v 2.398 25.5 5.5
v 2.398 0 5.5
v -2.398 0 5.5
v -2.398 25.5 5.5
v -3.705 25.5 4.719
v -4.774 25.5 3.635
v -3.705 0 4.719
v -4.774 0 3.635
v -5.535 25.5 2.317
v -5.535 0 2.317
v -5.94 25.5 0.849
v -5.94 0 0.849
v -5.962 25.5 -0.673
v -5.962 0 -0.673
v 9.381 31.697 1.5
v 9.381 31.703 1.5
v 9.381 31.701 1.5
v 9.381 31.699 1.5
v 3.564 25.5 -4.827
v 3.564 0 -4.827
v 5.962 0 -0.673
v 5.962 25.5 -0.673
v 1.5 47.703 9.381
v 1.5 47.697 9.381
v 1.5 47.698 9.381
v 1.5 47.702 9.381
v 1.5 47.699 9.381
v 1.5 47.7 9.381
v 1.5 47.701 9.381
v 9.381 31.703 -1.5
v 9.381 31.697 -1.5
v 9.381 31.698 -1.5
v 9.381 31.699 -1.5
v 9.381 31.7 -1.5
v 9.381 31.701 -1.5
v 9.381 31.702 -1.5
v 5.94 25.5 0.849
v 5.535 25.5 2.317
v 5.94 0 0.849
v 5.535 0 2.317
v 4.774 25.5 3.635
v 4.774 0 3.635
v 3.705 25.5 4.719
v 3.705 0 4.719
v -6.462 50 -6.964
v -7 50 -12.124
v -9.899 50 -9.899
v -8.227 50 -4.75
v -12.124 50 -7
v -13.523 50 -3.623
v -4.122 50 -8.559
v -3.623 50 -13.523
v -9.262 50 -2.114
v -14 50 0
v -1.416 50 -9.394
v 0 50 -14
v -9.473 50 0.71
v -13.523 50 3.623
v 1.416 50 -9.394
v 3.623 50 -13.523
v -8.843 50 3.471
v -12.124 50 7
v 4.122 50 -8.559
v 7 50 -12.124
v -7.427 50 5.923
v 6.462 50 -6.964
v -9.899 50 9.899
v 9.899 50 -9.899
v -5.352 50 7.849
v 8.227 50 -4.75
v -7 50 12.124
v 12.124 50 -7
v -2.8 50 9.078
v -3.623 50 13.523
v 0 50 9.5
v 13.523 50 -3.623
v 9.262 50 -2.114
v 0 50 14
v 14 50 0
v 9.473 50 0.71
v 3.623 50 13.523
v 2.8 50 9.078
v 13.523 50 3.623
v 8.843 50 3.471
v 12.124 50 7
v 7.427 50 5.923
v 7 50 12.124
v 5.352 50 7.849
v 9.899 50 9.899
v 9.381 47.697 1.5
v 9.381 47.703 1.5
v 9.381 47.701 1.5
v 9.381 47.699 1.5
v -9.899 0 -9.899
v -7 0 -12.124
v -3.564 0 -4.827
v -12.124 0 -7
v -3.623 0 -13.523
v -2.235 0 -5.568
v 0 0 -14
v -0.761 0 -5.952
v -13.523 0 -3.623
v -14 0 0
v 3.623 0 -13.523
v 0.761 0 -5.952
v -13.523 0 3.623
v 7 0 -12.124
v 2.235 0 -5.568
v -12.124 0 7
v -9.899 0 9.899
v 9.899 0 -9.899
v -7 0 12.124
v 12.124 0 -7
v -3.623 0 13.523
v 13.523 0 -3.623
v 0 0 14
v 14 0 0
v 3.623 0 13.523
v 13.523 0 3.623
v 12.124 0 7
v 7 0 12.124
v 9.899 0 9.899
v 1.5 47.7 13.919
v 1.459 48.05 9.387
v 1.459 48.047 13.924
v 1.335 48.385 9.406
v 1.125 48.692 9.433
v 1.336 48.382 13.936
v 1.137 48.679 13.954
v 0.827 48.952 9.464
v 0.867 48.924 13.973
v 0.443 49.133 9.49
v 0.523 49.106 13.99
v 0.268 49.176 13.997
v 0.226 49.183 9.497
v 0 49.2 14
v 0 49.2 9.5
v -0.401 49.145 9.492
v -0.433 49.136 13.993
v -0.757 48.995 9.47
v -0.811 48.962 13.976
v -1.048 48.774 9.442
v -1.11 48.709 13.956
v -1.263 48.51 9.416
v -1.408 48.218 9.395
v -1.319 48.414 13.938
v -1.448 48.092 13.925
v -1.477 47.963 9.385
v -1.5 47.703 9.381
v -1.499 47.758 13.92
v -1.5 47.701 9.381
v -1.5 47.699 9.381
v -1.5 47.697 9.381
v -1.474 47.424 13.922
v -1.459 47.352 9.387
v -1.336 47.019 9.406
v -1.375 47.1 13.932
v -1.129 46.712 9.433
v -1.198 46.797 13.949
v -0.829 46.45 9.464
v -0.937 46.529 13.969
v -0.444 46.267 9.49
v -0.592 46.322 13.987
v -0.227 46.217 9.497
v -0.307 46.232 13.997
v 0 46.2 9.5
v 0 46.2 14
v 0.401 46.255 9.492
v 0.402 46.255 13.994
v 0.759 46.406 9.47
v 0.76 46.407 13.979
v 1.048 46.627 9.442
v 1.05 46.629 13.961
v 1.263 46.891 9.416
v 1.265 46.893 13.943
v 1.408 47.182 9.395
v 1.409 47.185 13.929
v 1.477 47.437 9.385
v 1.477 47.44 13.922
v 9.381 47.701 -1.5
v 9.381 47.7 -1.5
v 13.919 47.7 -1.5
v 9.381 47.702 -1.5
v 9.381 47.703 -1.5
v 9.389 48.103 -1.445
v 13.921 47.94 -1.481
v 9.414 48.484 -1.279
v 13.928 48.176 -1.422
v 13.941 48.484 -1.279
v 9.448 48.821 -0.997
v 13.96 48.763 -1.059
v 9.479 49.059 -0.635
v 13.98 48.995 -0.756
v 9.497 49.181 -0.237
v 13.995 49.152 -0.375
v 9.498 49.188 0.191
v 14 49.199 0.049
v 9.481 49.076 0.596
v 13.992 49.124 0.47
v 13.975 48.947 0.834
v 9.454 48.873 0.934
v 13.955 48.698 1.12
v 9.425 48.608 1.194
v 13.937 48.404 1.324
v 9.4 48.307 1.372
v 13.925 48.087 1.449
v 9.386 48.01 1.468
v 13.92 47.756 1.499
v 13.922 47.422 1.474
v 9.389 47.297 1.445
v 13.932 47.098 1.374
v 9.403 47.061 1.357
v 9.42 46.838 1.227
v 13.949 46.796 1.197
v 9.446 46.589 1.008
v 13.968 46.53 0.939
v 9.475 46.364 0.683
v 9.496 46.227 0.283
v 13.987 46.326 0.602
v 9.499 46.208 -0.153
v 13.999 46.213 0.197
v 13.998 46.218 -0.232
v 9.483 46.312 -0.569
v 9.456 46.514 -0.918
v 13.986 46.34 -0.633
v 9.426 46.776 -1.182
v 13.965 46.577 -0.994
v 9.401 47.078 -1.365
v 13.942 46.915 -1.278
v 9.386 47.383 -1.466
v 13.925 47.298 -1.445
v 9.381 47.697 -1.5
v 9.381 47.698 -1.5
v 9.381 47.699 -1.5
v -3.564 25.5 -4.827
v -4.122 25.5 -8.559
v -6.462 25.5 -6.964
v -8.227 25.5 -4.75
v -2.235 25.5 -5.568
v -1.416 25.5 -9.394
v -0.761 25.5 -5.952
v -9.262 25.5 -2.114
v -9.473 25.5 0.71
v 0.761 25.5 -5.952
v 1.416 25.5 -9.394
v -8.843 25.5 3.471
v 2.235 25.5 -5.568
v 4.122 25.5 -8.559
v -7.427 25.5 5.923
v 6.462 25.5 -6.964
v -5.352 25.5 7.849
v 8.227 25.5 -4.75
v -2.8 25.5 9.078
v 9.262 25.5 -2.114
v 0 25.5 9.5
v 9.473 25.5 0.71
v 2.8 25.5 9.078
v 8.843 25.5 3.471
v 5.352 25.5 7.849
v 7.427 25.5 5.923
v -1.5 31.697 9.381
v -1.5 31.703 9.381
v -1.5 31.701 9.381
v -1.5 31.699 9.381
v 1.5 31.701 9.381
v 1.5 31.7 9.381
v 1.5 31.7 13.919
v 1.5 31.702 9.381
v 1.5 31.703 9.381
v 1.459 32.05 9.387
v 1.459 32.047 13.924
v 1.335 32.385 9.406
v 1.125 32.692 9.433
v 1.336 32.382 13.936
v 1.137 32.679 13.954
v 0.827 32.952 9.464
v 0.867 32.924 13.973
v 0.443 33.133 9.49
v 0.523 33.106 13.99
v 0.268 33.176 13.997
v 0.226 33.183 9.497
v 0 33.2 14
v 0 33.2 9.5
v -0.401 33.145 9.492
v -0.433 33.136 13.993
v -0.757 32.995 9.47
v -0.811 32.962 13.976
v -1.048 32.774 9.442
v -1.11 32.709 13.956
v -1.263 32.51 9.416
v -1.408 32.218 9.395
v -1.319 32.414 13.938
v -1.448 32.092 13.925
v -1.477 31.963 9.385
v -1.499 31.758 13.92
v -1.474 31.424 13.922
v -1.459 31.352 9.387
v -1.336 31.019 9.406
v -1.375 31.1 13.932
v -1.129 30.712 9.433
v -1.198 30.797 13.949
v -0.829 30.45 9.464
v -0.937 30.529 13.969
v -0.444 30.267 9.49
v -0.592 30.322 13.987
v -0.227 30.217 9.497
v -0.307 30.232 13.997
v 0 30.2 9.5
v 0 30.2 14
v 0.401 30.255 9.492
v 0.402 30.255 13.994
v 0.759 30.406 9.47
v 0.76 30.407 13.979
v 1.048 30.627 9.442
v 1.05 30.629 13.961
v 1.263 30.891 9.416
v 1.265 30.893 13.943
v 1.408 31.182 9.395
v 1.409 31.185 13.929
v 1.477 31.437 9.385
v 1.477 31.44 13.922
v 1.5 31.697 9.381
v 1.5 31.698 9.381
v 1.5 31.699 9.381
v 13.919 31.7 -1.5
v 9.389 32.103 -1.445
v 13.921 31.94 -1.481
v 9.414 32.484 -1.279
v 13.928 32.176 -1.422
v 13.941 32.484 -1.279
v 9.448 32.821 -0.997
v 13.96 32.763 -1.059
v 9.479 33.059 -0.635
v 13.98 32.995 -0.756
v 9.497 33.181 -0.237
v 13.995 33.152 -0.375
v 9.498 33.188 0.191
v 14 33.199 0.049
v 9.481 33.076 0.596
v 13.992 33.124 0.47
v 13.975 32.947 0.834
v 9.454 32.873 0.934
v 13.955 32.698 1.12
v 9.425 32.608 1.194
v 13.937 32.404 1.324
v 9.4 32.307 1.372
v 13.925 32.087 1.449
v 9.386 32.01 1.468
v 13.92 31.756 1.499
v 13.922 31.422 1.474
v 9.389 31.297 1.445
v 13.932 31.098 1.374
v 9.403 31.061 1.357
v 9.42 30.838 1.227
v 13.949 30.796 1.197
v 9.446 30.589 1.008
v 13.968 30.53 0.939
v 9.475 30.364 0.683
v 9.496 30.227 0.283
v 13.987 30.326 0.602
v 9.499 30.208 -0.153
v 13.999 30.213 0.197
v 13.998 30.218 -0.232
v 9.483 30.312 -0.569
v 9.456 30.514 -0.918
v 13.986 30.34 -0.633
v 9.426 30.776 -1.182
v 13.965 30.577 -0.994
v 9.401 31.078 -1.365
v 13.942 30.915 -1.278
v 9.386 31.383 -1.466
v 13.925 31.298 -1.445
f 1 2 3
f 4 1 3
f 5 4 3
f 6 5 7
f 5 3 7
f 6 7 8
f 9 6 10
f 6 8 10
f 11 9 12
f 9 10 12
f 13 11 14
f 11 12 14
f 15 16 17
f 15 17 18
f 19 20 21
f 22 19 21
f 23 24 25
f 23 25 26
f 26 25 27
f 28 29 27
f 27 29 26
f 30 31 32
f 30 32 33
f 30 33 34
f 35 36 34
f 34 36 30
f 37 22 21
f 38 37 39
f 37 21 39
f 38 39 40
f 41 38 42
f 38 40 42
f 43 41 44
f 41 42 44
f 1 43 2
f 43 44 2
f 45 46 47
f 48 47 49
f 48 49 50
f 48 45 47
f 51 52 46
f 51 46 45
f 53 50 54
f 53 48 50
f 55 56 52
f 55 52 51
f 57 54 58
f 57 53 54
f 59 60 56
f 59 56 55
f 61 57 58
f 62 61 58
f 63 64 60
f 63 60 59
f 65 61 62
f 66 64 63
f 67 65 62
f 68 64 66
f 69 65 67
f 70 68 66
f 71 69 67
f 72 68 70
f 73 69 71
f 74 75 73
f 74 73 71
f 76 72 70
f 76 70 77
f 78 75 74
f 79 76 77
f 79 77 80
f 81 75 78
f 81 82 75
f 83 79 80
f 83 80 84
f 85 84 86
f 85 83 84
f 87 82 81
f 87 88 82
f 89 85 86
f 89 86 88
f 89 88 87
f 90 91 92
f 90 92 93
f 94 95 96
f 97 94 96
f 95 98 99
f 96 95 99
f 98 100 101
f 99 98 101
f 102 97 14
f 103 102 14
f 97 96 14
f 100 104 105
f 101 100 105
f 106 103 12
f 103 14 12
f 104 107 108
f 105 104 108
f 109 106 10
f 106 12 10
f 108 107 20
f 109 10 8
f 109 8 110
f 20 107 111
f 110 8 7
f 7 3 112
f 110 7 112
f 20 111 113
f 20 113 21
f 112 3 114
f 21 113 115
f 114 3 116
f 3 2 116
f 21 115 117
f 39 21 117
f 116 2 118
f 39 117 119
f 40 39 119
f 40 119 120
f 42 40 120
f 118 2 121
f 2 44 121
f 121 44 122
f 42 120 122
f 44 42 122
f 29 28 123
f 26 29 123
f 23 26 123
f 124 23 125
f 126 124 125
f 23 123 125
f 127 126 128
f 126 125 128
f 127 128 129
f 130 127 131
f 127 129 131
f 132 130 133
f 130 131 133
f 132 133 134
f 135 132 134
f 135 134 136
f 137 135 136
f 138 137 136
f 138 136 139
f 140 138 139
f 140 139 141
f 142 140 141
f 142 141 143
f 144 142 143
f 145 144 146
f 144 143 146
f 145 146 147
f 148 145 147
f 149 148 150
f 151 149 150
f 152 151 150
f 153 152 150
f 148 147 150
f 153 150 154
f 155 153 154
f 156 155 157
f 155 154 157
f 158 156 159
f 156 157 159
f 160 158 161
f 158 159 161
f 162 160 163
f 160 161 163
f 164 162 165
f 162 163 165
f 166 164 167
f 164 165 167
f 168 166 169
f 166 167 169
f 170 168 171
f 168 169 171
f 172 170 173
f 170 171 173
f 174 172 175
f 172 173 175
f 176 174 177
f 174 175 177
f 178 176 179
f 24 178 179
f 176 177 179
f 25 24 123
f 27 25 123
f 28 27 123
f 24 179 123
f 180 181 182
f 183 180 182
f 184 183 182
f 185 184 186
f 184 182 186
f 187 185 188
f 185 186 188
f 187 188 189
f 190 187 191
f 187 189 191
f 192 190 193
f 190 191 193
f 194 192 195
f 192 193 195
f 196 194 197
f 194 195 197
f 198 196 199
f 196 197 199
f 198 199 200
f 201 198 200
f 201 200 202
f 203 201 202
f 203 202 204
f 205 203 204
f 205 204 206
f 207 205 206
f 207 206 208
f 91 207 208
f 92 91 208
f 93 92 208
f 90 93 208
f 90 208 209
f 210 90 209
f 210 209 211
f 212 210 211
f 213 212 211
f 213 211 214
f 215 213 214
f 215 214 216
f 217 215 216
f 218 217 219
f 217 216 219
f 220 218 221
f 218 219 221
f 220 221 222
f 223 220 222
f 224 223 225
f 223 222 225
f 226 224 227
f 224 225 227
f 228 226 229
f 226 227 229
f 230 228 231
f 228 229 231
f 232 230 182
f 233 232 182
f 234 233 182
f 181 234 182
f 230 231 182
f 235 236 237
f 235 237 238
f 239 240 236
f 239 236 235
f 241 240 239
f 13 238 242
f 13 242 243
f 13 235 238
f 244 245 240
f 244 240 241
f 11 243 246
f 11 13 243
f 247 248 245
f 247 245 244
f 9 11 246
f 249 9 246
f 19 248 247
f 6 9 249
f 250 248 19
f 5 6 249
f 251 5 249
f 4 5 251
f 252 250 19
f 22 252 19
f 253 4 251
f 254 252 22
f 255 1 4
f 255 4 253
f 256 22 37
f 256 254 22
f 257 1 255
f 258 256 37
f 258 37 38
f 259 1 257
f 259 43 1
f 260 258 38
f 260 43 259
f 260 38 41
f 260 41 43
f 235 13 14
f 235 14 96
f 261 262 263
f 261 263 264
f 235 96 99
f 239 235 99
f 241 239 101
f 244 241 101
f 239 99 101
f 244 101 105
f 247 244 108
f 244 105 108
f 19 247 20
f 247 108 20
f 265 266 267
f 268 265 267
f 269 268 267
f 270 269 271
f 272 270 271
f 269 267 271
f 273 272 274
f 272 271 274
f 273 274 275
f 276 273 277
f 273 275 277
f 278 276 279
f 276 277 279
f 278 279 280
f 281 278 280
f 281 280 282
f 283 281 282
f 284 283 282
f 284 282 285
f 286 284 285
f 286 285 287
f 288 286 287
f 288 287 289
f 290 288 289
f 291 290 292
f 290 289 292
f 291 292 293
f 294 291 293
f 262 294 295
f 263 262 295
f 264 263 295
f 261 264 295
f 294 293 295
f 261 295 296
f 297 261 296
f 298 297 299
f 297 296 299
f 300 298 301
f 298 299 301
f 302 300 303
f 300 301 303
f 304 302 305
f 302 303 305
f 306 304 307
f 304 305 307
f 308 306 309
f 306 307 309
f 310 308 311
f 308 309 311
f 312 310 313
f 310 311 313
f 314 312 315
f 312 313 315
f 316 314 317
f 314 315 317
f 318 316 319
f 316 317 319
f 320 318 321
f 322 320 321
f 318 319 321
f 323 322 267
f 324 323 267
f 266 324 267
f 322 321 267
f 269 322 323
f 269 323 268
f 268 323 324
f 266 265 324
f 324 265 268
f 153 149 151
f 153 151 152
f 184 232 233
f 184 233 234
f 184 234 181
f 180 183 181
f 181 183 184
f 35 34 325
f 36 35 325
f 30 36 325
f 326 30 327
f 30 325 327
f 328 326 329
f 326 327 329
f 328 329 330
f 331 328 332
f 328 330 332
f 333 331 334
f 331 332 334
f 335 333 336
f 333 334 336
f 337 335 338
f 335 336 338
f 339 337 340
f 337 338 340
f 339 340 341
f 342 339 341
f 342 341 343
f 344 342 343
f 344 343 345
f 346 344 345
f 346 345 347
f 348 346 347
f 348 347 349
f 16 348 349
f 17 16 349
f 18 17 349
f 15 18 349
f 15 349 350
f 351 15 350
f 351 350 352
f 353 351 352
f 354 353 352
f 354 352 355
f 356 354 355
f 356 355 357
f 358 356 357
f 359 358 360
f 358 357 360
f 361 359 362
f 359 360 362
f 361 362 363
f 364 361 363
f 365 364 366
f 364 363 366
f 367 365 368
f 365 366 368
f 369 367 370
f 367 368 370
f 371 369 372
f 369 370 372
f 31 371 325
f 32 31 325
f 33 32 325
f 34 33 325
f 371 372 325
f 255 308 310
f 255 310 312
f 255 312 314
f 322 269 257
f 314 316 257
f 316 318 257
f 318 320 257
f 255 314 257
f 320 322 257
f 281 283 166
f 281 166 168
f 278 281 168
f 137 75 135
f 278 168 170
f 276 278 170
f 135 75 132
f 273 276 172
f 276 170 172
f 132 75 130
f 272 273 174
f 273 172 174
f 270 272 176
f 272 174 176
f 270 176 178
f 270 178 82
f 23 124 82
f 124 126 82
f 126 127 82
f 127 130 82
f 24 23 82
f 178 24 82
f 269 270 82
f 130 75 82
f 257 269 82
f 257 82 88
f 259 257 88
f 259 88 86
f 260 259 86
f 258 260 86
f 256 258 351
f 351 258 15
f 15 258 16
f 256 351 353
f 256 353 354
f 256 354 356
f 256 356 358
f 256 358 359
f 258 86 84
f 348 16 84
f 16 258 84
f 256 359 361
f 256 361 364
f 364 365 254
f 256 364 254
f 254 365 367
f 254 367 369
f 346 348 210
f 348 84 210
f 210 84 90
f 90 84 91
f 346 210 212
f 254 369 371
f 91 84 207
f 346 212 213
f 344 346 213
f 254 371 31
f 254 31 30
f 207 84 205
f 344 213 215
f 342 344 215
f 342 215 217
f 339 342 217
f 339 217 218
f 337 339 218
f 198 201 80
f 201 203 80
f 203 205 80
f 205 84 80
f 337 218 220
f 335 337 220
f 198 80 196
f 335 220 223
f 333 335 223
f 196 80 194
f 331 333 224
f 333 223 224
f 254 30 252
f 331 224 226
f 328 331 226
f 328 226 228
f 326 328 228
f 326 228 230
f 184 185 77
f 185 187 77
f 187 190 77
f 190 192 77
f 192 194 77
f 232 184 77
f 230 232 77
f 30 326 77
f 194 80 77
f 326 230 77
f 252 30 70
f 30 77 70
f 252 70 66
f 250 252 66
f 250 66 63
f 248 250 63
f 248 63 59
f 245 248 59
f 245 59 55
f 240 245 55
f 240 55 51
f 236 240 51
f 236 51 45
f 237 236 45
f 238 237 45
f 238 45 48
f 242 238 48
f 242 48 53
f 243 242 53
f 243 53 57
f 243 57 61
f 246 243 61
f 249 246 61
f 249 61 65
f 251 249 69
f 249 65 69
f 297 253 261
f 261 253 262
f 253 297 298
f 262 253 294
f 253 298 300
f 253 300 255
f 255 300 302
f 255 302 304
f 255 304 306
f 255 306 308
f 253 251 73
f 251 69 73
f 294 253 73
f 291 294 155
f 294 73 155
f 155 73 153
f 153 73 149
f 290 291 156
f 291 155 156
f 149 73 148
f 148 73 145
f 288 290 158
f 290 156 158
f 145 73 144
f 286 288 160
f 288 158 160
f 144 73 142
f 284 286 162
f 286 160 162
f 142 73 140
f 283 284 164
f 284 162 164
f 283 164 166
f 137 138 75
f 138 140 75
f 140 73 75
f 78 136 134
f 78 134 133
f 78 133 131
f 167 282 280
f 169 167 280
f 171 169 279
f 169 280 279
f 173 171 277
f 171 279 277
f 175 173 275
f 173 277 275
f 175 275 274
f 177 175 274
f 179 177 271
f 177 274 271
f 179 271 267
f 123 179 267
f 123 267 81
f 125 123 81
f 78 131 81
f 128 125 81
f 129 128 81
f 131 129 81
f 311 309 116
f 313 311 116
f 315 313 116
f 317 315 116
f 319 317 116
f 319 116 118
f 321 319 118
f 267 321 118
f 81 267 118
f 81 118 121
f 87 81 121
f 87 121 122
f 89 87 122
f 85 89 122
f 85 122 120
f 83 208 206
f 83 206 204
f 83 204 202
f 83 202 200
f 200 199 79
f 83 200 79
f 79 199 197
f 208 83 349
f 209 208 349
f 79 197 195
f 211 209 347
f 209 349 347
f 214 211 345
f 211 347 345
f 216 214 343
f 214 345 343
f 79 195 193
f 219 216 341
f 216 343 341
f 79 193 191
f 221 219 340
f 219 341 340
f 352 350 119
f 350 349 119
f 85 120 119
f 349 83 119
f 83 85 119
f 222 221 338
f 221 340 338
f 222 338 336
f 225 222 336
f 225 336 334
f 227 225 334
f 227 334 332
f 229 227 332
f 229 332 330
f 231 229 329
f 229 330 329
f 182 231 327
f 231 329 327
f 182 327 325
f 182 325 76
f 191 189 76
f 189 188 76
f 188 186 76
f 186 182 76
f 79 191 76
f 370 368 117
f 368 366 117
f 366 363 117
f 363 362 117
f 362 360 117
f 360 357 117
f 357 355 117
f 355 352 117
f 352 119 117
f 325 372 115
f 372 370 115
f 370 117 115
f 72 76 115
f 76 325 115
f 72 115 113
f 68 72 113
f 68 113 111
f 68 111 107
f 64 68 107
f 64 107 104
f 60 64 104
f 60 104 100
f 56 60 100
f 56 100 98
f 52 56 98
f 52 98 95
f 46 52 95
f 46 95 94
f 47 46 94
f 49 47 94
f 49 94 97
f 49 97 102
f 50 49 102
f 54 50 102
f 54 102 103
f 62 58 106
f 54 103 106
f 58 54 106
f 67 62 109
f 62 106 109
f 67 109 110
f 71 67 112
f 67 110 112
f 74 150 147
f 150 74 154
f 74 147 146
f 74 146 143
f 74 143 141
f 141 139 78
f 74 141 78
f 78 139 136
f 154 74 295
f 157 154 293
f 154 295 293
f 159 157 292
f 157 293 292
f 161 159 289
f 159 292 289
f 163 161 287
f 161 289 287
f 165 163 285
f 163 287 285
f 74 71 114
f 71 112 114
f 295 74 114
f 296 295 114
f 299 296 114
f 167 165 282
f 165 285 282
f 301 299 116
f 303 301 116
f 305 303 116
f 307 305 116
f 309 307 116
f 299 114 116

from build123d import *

# Parameters (mm, degrees)
SKETCH1_R           = 14
BOSS_EXTRUDE1_DEPTH = 50
CUT_EXTRUDE1_DEPTH  = 33
SKETCH3_R           = 9.5
CUT_EXTRUDE2_DEPTH  = 24.5
SKETCH5_R           = 1.5
CUT_EXTRUDE3_DEPTH  = 4.619168
CIRPATTERN1_COUNT   = 2
CIRPATTERN1_ANGLE   = 90


with BuildPart() as part:
    # Sketch1 → Boss-Extrude1 (new body)
    with BuildSketch(Plane(origin=(0, 0, 0), x_dir=(1, 0, 0), z_dir=(0, 1, 0))):
        with Locations(Location((0, 0, 0), (0, 0, 270))):  # turned: the seam where the file's is
            Circle(SKETCH1_R)
    extrude(amount=BOSS_EXTRUDE1_DEPTH)

    # Sketch2 → Cut-Extrude1 (cut)
    with BuildSketch(Plane(origin=(0, 0, 0), x_dir=(-1, 0, 0), z_dir=(0, -1, 0))):
        with BuildLine():
            Line((-2.397915762, -5.5), (2.397915762, -5.5))
            ThreePointArc((2.397915762, -5.5), (5.196152423, -3), (5.962097602, 0.673344034))
            Line((5.962097602, 0.673344034), (3.56418184, 4.826655966))
            ThreePointArc((3.56418184, 4.826655966), (0, 6), (-3.56418184, 4.826655966))
            Line((-3.56418184, 4.826655966), (-5.962097602, 0.673344034))
            ThreePointArc((-5.962097602, 0.673344034), (-5.196152423, -3), (-2.397915762, -5.5))
        make_face()
    extrude(amount=-CUT_EXTRUDE1_DEPTH, mode=Mode.SUBTRACT)

    # Sketch3 → Cut-Extrude2 (cut)
    with BuildSketch(Plane(origin=(0, 50, 0), x_dir=(1, 0, 0), z_dir=(0, 1, 0))):
        with Locations(Location((0, 0, 0), (0, 0, 270))):  # turned: the seam where the file's is
            Circle(SKETCH3_R)
    extrude(amount=-CUT_EXTRUDE2_DEPTH, mode=Mode.SUBTRACT)

    # Sketch5 → Cut-Extrude3 (cut)
    with BuildSketch(Plane(origin=(14, 50, 0), x_dir=(0, 0, -1), z_dir=(1, 0, 0))):
        with Locations((0, -2.3)):
            Circle(SKETCH5_R)
        with Locations((0, -18.3)):
            Circle(SKETCH5_R)
    cut_extrude3 = extrude(amount=-CUT_EXTRUDE3_DEPTH, mode=Mode.SUBTRACT)

    # CirPattern1: Cut-Extrude3 ×2 about axis
    cirpattern1_axis = Axis((0, 33, 0), (0, -1, 0))
    for i in range(1, CIRPATTERN1_COUNT):
        add(cut_extrude3.rotate(cirpattern1_axis, i * CIRPATTERN1_ANGLE / (CIRPATTERN1_COUNT - 1)), mode=Mode.SUBTRACT)


solid = part.part
